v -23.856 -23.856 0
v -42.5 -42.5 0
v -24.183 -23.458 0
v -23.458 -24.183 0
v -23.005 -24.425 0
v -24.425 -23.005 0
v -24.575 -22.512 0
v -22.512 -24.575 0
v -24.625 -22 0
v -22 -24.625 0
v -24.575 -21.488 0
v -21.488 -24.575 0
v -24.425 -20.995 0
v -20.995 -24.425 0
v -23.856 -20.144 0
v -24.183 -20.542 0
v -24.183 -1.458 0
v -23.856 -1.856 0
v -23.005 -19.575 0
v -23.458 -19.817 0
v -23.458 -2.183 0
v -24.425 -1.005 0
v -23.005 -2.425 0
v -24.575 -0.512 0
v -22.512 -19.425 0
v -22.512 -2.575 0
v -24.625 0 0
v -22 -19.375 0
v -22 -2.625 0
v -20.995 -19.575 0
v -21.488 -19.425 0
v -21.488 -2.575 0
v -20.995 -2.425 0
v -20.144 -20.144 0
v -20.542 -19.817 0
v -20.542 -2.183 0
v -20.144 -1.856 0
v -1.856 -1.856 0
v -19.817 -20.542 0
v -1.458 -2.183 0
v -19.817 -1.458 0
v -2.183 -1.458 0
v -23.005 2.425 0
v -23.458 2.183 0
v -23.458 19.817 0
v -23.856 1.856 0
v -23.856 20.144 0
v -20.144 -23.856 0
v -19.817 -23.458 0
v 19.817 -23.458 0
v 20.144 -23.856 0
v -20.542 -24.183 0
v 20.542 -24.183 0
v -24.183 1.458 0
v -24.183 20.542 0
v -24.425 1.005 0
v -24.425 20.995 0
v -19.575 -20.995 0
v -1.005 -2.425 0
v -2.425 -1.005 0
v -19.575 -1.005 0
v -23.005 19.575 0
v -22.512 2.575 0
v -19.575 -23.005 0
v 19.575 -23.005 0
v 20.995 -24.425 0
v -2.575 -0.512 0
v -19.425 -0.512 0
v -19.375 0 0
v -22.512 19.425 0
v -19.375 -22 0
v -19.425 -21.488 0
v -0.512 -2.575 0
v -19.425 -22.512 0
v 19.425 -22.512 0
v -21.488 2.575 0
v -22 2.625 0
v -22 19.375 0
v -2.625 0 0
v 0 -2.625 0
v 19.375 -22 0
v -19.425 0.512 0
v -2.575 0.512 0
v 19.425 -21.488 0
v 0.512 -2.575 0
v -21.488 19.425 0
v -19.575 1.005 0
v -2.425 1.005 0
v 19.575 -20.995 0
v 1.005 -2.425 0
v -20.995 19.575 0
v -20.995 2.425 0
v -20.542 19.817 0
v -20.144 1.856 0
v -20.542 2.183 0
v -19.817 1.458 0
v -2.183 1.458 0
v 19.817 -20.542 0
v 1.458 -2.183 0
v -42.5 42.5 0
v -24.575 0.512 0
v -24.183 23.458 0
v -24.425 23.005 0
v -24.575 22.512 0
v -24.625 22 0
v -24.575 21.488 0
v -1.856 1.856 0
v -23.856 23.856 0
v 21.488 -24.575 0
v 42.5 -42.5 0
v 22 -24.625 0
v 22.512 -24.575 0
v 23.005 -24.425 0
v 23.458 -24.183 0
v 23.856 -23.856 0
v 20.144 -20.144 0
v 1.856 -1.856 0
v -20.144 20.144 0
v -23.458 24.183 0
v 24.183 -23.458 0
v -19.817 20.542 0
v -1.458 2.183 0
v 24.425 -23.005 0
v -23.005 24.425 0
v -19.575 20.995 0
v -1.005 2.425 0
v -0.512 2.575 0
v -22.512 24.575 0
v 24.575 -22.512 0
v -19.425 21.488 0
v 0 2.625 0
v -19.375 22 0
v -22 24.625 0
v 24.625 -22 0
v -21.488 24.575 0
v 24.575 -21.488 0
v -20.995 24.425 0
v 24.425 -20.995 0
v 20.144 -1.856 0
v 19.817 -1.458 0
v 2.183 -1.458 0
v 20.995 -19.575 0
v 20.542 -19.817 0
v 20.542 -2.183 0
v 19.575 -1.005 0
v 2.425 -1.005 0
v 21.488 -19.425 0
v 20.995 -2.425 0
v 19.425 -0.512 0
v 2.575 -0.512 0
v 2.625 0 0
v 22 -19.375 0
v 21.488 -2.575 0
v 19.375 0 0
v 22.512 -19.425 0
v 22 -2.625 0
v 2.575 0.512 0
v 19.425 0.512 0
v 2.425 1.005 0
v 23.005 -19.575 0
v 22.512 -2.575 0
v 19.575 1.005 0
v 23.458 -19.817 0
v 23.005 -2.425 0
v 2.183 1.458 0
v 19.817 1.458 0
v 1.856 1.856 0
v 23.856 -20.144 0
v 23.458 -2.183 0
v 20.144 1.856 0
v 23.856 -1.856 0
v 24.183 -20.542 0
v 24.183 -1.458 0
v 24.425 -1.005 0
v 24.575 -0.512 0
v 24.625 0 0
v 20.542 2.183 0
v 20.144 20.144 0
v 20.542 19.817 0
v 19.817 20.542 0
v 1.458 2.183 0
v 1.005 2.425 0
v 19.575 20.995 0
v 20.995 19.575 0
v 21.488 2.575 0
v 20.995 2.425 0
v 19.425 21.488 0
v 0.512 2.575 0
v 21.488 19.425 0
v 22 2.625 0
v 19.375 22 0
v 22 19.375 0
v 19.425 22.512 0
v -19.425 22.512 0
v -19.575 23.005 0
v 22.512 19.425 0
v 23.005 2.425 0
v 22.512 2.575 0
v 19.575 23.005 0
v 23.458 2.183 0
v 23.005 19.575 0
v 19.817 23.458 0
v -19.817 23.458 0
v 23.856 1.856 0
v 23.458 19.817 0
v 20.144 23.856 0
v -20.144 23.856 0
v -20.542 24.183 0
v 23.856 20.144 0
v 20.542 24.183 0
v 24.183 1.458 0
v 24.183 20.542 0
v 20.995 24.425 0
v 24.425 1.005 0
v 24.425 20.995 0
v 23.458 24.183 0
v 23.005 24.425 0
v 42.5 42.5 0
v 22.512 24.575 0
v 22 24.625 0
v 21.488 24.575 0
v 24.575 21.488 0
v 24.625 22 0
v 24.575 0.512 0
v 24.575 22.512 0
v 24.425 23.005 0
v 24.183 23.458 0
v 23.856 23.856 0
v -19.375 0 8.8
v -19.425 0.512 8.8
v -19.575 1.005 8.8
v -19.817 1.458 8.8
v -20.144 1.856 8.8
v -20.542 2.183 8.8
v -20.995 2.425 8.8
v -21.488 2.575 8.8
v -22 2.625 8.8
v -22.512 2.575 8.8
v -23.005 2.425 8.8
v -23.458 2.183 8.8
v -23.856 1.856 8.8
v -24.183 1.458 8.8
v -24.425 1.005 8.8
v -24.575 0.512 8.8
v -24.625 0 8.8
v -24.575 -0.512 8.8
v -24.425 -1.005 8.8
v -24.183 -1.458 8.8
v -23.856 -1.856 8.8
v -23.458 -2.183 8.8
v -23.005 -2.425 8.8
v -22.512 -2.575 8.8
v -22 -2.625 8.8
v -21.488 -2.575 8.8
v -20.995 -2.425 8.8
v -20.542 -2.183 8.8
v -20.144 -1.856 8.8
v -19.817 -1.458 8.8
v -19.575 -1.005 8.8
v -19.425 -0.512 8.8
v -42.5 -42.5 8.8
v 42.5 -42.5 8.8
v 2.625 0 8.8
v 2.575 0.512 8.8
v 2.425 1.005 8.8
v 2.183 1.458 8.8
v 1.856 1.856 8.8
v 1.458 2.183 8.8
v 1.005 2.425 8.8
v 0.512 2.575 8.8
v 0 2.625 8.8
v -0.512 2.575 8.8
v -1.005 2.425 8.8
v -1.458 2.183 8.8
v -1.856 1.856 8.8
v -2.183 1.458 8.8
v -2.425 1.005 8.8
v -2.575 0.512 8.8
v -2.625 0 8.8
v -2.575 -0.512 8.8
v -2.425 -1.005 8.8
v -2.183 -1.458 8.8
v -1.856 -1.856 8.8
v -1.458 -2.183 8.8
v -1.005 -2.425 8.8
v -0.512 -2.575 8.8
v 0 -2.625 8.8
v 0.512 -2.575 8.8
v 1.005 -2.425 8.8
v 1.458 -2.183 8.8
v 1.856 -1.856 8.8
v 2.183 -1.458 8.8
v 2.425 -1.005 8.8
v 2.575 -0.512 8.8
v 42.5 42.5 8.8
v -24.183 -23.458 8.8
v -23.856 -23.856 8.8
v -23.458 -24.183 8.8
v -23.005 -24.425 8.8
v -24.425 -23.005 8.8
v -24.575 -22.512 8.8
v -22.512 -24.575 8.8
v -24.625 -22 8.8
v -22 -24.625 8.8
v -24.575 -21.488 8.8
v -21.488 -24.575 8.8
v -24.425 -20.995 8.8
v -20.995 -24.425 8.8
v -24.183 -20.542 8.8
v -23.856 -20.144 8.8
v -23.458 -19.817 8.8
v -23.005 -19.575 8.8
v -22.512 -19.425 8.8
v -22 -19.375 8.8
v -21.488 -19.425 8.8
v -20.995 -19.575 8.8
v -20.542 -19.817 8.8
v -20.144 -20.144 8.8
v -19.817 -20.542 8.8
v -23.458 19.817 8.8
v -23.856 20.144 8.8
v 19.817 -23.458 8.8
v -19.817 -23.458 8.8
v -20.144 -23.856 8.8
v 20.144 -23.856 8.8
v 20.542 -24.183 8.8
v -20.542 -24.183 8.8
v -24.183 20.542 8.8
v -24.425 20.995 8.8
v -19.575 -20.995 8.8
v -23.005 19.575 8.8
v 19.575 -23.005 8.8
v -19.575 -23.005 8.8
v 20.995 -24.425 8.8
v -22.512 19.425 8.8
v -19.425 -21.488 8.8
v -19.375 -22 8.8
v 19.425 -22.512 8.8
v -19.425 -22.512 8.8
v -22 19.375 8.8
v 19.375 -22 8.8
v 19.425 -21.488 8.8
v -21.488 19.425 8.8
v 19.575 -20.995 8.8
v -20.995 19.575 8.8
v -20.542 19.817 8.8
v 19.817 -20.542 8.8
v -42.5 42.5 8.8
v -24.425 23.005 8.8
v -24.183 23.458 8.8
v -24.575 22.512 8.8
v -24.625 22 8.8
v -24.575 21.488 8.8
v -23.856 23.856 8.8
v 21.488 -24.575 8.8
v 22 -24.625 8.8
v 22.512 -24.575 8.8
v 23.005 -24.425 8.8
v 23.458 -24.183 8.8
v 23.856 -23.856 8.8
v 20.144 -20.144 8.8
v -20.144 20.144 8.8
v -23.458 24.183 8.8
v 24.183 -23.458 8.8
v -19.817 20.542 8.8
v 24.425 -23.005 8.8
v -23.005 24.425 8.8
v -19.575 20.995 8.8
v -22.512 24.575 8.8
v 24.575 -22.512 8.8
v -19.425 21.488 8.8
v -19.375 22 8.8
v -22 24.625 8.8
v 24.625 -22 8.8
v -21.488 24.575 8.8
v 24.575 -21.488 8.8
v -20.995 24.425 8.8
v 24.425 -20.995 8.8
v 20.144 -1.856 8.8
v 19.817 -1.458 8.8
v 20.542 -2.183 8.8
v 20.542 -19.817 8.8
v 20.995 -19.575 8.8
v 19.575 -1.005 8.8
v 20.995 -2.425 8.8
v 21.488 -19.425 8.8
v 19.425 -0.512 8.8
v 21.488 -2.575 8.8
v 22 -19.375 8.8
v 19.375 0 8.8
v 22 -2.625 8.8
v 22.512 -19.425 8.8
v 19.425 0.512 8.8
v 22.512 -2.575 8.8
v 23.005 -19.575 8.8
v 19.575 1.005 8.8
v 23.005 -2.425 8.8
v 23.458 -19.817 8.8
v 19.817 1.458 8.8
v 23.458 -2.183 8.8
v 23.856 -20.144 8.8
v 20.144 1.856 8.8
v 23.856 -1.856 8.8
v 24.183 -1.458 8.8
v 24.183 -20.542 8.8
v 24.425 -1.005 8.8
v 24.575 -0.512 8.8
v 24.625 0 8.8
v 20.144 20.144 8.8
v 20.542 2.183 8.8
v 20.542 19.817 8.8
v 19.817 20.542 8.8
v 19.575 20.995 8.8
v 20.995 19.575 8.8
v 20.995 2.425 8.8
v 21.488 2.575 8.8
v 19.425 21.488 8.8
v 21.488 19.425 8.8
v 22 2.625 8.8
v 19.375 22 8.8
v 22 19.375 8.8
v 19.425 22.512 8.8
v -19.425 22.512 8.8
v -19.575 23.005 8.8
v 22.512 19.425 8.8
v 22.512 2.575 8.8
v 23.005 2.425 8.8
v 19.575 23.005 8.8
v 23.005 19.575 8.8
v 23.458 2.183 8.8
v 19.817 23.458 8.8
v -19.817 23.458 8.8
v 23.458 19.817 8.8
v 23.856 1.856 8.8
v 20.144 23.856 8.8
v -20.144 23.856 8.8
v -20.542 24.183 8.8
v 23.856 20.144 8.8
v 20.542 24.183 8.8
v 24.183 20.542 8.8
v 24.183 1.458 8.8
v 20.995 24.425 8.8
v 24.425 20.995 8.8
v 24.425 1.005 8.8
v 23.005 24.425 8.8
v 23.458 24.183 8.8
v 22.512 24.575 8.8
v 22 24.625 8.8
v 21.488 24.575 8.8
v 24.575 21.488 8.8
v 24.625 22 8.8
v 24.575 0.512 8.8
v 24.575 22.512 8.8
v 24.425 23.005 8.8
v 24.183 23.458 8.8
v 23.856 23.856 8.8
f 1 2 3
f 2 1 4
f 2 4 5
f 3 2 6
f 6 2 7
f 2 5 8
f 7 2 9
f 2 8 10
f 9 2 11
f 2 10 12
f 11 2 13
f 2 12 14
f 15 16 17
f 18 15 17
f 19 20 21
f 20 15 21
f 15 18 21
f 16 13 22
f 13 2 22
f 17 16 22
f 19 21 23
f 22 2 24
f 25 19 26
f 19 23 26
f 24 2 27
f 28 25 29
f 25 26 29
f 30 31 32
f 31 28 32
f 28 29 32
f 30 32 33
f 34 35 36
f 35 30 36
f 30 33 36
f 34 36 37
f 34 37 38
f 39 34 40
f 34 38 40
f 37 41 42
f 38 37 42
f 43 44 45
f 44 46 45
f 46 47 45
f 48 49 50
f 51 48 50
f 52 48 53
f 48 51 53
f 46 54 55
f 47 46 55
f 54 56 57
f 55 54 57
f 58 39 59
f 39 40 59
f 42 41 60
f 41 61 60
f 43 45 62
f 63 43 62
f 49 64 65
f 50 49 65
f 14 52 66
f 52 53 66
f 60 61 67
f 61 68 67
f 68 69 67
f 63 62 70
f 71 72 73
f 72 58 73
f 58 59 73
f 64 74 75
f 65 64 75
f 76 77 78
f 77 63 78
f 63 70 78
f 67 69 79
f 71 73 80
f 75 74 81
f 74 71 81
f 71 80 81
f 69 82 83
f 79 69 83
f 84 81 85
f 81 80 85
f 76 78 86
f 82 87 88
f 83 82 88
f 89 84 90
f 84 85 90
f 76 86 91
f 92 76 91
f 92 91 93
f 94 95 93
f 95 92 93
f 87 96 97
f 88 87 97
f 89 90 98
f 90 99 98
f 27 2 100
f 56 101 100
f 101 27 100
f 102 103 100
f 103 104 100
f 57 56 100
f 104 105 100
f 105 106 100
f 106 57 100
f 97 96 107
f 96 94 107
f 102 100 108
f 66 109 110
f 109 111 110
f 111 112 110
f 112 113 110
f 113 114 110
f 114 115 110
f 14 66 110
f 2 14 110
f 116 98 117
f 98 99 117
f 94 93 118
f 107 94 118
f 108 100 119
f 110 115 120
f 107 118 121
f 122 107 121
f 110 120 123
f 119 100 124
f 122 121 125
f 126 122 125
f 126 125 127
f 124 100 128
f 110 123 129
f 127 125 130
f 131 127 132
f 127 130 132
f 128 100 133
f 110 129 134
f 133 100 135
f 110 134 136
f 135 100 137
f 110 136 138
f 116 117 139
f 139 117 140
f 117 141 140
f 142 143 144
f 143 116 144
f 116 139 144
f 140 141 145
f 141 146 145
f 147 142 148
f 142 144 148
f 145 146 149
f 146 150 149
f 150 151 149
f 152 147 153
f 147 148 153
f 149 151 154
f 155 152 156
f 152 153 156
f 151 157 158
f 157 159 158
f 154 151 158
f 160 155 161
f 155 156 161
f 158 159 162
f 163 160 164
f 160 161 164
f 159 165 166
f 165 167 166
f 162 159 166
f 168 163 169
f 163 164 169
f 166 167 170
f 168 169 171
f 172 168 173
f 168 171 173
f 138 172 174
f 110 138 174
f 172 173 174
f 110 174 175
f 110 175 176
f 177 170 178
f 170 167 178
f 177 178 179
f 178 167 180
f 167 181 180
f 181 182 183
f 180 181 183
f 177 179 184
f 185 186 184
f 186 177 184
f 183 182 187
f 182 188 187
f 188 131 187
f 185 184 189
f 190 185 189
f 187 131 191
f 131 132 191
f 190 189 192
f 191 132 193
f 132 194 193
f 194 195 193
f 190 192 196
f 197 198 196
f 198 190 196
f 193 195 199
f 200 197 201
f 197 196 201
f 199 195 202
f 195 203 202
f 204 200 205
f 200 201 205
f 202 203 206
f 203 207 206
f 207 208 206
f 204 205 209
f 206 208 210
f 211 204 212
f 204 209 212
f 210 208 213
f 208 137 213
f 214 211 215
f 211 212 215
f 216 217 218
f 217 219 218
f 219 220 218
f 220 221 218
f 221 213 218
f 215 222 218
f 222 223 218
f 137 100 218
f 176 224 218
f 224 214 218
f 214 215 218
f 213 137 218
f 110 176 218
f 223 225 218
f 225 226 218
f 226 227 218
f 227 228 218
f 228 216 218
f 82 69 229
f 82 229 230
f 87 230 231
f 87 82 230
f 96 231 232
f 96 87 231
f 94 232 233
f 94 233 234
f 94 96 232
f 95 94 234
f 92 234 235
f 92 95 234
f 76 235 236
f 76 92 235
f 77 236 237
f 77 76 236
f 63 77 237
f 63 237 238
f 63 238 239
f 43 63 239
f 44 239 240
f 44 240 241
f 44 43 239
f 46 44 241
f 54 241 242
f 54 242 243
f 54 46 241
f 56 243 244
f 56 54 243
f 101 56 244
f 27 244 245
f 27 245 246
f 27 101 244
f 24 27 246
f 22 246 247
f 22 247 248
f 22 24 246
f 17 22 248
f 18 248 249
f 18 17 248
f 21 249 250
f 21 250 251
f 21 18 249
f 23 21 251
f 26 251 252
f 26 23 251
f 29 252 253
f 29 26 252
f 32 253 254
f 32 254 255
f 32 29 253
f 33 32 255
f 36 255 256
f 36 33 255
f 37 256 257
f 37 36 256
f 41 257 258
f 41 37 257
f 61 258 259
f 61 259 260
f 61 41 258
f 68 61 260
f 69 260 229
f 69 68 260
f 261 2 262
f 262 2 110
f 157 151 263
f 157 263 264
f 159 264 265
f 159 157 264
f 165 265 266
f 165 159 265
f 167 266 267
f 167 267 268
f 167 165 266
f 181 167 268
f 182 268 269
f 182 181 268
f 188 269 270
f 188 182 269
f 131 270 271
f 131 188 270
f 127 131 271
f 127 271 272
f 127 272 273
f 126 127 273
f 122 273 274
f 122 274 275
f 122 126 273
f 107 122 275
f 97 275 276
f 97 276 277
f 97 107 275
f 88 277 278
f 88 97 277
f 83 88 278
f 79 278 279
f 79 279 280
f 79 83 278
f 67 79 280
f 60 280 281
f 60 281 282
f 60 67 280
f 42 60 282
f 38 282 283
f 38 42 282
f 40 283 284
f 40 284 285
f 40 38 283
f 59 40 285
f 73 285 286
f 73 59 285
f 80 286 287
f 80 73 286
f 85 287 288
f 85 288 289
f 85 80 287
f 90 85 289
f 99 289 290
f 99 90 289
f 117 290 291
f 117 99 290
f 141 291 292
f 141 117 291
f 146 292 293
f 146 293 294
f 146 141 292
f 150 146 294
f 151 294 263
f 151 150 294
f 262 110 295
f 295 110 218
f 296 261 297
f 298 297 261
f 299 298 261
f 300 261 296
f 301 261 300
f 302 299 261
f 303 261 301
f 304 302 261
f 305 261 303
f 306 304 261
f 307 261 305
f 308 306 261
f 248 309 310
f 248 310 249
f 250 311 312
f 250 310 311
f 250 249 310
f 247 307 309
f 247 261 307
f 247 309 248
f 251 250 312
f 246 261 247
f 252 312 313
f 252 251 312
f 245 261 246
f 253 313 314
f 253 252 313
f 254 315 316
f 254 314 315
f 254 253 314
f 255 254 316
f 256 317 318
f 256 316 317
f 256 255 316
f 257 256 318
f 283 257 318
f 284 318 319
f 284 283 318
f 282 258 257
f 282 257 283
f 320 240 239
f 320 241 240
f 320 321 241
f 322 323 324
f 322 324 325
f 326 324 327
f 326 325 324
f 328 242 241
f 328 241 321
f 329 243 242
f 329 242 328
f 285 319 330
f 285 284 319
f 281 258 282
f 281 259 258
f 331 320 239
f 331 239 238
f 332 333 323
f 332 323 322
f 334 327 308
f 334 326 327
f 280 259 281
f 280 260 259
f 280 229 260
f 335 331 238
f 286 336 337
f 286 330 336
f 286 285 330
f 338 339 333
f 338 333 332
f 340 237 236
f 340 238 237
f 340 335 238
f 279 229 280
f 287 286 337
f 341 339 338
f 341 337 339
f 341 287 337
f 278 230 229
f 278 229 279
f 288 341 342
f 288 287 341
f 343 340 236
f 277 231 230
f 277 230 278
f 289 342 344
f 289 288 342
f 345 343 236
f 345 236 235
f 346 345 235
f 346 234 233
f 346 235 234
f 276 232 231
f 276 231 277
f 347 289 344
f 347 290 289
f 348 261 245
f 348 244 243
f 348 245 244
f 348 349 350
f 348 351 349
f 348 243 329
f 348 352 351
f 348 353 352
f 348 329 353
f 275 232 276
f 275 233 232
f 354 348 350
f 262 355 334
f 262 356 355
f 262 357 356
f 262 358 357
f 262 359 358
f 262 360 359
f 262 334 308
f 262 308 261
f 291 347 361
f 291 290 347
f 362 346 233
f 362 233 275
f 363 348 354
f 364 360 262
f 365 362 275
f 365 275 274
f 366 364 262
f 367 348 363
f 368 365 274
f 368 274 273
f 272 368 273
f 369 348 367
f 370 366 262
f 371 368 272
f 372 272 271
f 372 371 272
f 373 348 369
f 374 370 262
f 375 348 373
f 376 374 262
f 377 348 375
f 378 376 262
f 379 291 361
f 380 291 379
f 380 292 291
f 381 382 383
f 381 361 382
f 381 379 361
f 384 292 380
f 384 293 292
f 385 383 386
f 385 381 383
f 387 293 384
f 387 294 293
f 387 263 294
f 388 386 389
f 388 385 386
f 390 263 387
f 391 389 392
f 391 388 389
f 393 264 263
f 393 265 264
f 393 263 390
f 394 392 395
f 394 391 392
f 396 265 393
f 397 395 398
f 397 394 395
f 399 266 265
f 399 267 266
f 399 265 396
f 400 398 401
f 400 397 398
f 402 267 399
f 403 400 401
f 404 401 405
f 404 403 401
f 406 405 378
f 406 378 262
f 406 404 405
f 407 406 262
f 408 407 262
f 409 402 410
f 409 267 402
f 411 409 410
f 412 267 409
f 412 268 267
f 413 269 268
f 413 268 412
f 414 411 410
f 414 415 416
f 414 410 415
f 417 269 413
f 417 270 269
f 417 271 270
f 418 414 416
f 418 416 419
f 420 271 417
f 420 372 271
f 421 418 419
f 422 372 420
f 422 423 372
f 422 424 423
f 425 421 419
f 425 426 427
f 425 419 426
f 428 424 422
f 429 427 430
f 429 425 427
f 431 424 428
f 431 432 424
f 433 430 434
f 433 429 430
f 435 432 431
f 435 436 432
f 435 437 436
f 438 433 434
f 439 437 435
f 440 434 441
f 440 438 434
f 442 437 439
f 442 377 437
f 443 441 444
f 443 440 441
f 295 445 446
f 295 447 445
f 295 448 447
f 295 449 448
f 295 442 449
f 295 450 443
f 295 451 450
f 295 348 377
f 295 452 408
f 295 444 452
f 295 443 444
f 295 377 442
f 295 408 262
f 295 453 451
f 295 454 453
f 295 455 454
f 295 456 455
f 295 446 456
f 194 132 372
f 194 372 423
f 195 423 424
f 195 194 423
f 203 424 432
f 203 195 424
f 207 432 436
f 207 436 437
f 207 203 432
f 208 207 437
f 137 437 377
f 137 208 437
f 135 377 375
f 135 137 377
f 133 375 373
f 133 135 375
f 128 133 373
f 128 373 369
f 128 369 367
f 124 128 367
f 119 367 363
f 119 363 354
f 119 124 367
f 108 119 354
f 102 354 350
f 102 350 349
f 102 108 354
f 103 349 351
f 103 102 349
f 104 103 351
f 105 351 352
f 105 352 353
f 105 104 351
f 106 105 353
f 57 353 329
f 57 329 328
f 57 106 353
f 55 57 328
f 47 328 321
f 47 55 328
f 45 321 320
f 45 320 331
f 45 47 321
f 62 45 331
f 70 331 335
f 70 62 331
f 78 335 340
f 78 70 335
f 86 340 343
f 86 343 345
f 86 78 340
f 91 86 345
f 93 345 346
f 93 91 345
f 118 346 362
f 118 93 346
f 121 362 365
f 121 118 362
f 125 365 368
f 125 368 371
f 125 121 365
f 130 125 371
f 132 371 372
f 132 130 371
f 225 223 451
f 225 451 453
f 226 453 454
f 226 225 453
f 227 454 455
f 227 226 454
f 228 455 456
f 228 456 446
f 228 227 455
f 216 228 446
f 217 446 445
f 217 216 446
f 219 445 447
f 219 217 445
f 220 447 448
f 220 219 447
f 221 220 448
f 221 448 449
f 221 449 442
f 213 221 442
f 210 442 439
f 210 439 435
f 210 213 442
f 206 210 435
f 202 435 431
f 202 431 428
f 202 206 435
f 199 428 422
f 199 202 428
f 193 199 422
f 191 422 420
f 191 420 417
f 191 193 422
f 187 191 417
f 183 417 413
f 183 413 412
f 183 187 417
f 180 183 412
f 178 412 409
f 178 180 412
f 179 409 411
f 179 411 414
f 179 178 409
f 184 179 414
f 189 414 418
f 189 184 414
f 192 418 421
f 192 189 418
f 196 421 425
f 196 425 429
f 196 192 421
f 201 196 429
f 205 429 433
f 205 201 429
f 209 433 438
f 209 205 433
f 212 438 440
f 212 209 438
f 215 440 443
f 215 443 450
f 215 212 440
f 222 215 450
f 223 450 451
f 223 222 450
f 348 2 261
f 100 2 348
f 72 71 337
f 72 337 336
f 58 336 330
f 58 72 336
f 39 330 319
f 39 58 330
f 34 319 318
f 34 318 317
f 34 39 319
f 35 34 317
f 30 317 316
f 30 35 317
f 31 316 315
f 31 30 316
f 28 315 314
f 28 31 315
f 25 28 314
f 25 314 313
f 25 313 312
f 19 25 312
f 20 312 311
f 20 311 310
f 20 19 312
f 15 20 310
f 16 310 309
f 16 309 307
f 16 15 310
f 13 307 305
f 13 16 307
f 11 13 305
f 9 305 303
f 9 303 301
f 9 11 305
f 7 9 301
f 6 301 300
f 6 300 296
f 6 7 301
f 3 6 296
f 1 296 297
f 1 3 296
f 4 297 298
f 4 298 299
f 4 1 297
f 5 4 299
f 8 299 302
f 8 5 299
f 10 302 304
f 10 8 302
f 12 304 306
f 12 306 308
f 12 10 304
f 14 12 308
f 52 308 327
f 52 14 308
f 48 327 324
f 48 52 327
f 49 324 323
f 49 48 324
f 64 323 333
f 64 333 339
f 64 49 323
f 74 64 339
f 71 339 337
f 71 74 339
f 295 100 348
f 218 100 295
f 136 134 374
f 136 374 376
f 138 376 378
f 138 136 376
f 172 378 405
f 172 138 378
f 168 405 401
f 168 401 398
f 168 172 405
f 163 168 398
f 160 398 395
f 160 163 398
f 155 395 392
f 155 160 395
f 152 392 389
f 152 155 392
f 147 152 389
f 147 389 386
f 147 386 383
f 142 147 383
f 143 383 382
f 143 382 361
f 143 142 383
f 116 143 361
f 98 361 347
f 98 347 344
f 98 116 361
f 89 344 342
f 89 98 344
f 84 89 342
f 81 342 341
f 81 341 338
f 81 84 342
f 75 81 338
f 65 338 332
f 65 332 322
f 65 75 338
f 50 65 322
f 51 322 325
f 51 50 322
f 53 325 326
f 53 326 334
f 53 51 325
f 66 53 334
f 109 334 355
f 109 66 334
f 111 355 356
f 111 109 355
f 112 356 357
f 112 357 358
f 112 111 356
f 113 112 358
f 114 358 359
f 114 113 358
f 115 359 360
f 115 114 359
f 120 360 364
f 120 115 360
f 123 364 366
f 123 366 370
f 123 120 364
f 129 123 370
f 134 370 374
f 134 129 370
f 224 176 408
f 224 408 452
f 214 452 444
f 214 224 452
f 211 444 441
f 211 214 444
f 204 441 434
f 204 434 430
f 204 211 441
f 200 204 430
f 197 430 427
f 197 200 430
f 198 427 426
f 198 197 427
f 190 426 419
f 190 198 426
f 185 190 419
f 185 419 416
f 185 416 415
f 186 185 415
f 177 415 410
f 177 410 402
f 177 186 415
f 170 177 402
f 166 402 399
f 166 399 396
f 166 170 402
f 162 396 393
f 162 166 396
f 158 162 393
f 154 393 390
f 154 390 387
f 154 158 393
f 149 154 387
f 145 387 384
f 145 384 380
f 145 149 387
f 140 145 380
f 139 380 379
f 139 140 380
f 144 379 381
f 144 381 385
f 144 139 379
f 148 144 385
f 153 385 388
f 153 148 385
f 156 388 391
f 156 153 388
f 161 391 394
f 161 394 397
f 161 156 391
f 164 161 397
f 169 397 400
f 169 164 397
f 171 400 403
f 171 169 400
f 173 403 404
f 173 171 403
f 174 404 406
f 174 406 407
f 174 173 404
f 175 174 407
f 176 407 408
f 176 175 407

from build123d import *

# Parameters (mm, degrees)
SKETCH_W  = 85
SKETCH_H  = 85
SKETCH_R  = 2.625
PAD_DEPTH = 8.8


with BuildPart() as part:
    # Sketch → Pad (new body)
    with BuildSketch(Plane.XY):
        Rectangle(SKETCH_W, SKETCH_H)
        with Locations((-22, 22)):
            Circle(SKETCH_R, mode=Mode.SUBTRACT)
        with Locations((-22, 0)):
            Circle(SKETCH_R, mode=Mode.SUBTRACT)
        with Locations((-22, -22)):
            Circle(SKETCH_R, mode=Mode.SUBTRACT)
        Circle(SKETCH_R, mode=Mode.SUBTRACT)
        with Locations((22, 22)):
            Circle(SKETCH_R, mode=Mode.SUBTRACT)
        with Locations((22, 0)):
            Circle(SKETCH_R, mode=Mode.SUBTRACT)
        with Locations((22, -22)):
            Circle(SKETCH_R, mode=Mode.SUBTRACT)
    extrude(amount=PAD_DEPTH)


solid = part.part
